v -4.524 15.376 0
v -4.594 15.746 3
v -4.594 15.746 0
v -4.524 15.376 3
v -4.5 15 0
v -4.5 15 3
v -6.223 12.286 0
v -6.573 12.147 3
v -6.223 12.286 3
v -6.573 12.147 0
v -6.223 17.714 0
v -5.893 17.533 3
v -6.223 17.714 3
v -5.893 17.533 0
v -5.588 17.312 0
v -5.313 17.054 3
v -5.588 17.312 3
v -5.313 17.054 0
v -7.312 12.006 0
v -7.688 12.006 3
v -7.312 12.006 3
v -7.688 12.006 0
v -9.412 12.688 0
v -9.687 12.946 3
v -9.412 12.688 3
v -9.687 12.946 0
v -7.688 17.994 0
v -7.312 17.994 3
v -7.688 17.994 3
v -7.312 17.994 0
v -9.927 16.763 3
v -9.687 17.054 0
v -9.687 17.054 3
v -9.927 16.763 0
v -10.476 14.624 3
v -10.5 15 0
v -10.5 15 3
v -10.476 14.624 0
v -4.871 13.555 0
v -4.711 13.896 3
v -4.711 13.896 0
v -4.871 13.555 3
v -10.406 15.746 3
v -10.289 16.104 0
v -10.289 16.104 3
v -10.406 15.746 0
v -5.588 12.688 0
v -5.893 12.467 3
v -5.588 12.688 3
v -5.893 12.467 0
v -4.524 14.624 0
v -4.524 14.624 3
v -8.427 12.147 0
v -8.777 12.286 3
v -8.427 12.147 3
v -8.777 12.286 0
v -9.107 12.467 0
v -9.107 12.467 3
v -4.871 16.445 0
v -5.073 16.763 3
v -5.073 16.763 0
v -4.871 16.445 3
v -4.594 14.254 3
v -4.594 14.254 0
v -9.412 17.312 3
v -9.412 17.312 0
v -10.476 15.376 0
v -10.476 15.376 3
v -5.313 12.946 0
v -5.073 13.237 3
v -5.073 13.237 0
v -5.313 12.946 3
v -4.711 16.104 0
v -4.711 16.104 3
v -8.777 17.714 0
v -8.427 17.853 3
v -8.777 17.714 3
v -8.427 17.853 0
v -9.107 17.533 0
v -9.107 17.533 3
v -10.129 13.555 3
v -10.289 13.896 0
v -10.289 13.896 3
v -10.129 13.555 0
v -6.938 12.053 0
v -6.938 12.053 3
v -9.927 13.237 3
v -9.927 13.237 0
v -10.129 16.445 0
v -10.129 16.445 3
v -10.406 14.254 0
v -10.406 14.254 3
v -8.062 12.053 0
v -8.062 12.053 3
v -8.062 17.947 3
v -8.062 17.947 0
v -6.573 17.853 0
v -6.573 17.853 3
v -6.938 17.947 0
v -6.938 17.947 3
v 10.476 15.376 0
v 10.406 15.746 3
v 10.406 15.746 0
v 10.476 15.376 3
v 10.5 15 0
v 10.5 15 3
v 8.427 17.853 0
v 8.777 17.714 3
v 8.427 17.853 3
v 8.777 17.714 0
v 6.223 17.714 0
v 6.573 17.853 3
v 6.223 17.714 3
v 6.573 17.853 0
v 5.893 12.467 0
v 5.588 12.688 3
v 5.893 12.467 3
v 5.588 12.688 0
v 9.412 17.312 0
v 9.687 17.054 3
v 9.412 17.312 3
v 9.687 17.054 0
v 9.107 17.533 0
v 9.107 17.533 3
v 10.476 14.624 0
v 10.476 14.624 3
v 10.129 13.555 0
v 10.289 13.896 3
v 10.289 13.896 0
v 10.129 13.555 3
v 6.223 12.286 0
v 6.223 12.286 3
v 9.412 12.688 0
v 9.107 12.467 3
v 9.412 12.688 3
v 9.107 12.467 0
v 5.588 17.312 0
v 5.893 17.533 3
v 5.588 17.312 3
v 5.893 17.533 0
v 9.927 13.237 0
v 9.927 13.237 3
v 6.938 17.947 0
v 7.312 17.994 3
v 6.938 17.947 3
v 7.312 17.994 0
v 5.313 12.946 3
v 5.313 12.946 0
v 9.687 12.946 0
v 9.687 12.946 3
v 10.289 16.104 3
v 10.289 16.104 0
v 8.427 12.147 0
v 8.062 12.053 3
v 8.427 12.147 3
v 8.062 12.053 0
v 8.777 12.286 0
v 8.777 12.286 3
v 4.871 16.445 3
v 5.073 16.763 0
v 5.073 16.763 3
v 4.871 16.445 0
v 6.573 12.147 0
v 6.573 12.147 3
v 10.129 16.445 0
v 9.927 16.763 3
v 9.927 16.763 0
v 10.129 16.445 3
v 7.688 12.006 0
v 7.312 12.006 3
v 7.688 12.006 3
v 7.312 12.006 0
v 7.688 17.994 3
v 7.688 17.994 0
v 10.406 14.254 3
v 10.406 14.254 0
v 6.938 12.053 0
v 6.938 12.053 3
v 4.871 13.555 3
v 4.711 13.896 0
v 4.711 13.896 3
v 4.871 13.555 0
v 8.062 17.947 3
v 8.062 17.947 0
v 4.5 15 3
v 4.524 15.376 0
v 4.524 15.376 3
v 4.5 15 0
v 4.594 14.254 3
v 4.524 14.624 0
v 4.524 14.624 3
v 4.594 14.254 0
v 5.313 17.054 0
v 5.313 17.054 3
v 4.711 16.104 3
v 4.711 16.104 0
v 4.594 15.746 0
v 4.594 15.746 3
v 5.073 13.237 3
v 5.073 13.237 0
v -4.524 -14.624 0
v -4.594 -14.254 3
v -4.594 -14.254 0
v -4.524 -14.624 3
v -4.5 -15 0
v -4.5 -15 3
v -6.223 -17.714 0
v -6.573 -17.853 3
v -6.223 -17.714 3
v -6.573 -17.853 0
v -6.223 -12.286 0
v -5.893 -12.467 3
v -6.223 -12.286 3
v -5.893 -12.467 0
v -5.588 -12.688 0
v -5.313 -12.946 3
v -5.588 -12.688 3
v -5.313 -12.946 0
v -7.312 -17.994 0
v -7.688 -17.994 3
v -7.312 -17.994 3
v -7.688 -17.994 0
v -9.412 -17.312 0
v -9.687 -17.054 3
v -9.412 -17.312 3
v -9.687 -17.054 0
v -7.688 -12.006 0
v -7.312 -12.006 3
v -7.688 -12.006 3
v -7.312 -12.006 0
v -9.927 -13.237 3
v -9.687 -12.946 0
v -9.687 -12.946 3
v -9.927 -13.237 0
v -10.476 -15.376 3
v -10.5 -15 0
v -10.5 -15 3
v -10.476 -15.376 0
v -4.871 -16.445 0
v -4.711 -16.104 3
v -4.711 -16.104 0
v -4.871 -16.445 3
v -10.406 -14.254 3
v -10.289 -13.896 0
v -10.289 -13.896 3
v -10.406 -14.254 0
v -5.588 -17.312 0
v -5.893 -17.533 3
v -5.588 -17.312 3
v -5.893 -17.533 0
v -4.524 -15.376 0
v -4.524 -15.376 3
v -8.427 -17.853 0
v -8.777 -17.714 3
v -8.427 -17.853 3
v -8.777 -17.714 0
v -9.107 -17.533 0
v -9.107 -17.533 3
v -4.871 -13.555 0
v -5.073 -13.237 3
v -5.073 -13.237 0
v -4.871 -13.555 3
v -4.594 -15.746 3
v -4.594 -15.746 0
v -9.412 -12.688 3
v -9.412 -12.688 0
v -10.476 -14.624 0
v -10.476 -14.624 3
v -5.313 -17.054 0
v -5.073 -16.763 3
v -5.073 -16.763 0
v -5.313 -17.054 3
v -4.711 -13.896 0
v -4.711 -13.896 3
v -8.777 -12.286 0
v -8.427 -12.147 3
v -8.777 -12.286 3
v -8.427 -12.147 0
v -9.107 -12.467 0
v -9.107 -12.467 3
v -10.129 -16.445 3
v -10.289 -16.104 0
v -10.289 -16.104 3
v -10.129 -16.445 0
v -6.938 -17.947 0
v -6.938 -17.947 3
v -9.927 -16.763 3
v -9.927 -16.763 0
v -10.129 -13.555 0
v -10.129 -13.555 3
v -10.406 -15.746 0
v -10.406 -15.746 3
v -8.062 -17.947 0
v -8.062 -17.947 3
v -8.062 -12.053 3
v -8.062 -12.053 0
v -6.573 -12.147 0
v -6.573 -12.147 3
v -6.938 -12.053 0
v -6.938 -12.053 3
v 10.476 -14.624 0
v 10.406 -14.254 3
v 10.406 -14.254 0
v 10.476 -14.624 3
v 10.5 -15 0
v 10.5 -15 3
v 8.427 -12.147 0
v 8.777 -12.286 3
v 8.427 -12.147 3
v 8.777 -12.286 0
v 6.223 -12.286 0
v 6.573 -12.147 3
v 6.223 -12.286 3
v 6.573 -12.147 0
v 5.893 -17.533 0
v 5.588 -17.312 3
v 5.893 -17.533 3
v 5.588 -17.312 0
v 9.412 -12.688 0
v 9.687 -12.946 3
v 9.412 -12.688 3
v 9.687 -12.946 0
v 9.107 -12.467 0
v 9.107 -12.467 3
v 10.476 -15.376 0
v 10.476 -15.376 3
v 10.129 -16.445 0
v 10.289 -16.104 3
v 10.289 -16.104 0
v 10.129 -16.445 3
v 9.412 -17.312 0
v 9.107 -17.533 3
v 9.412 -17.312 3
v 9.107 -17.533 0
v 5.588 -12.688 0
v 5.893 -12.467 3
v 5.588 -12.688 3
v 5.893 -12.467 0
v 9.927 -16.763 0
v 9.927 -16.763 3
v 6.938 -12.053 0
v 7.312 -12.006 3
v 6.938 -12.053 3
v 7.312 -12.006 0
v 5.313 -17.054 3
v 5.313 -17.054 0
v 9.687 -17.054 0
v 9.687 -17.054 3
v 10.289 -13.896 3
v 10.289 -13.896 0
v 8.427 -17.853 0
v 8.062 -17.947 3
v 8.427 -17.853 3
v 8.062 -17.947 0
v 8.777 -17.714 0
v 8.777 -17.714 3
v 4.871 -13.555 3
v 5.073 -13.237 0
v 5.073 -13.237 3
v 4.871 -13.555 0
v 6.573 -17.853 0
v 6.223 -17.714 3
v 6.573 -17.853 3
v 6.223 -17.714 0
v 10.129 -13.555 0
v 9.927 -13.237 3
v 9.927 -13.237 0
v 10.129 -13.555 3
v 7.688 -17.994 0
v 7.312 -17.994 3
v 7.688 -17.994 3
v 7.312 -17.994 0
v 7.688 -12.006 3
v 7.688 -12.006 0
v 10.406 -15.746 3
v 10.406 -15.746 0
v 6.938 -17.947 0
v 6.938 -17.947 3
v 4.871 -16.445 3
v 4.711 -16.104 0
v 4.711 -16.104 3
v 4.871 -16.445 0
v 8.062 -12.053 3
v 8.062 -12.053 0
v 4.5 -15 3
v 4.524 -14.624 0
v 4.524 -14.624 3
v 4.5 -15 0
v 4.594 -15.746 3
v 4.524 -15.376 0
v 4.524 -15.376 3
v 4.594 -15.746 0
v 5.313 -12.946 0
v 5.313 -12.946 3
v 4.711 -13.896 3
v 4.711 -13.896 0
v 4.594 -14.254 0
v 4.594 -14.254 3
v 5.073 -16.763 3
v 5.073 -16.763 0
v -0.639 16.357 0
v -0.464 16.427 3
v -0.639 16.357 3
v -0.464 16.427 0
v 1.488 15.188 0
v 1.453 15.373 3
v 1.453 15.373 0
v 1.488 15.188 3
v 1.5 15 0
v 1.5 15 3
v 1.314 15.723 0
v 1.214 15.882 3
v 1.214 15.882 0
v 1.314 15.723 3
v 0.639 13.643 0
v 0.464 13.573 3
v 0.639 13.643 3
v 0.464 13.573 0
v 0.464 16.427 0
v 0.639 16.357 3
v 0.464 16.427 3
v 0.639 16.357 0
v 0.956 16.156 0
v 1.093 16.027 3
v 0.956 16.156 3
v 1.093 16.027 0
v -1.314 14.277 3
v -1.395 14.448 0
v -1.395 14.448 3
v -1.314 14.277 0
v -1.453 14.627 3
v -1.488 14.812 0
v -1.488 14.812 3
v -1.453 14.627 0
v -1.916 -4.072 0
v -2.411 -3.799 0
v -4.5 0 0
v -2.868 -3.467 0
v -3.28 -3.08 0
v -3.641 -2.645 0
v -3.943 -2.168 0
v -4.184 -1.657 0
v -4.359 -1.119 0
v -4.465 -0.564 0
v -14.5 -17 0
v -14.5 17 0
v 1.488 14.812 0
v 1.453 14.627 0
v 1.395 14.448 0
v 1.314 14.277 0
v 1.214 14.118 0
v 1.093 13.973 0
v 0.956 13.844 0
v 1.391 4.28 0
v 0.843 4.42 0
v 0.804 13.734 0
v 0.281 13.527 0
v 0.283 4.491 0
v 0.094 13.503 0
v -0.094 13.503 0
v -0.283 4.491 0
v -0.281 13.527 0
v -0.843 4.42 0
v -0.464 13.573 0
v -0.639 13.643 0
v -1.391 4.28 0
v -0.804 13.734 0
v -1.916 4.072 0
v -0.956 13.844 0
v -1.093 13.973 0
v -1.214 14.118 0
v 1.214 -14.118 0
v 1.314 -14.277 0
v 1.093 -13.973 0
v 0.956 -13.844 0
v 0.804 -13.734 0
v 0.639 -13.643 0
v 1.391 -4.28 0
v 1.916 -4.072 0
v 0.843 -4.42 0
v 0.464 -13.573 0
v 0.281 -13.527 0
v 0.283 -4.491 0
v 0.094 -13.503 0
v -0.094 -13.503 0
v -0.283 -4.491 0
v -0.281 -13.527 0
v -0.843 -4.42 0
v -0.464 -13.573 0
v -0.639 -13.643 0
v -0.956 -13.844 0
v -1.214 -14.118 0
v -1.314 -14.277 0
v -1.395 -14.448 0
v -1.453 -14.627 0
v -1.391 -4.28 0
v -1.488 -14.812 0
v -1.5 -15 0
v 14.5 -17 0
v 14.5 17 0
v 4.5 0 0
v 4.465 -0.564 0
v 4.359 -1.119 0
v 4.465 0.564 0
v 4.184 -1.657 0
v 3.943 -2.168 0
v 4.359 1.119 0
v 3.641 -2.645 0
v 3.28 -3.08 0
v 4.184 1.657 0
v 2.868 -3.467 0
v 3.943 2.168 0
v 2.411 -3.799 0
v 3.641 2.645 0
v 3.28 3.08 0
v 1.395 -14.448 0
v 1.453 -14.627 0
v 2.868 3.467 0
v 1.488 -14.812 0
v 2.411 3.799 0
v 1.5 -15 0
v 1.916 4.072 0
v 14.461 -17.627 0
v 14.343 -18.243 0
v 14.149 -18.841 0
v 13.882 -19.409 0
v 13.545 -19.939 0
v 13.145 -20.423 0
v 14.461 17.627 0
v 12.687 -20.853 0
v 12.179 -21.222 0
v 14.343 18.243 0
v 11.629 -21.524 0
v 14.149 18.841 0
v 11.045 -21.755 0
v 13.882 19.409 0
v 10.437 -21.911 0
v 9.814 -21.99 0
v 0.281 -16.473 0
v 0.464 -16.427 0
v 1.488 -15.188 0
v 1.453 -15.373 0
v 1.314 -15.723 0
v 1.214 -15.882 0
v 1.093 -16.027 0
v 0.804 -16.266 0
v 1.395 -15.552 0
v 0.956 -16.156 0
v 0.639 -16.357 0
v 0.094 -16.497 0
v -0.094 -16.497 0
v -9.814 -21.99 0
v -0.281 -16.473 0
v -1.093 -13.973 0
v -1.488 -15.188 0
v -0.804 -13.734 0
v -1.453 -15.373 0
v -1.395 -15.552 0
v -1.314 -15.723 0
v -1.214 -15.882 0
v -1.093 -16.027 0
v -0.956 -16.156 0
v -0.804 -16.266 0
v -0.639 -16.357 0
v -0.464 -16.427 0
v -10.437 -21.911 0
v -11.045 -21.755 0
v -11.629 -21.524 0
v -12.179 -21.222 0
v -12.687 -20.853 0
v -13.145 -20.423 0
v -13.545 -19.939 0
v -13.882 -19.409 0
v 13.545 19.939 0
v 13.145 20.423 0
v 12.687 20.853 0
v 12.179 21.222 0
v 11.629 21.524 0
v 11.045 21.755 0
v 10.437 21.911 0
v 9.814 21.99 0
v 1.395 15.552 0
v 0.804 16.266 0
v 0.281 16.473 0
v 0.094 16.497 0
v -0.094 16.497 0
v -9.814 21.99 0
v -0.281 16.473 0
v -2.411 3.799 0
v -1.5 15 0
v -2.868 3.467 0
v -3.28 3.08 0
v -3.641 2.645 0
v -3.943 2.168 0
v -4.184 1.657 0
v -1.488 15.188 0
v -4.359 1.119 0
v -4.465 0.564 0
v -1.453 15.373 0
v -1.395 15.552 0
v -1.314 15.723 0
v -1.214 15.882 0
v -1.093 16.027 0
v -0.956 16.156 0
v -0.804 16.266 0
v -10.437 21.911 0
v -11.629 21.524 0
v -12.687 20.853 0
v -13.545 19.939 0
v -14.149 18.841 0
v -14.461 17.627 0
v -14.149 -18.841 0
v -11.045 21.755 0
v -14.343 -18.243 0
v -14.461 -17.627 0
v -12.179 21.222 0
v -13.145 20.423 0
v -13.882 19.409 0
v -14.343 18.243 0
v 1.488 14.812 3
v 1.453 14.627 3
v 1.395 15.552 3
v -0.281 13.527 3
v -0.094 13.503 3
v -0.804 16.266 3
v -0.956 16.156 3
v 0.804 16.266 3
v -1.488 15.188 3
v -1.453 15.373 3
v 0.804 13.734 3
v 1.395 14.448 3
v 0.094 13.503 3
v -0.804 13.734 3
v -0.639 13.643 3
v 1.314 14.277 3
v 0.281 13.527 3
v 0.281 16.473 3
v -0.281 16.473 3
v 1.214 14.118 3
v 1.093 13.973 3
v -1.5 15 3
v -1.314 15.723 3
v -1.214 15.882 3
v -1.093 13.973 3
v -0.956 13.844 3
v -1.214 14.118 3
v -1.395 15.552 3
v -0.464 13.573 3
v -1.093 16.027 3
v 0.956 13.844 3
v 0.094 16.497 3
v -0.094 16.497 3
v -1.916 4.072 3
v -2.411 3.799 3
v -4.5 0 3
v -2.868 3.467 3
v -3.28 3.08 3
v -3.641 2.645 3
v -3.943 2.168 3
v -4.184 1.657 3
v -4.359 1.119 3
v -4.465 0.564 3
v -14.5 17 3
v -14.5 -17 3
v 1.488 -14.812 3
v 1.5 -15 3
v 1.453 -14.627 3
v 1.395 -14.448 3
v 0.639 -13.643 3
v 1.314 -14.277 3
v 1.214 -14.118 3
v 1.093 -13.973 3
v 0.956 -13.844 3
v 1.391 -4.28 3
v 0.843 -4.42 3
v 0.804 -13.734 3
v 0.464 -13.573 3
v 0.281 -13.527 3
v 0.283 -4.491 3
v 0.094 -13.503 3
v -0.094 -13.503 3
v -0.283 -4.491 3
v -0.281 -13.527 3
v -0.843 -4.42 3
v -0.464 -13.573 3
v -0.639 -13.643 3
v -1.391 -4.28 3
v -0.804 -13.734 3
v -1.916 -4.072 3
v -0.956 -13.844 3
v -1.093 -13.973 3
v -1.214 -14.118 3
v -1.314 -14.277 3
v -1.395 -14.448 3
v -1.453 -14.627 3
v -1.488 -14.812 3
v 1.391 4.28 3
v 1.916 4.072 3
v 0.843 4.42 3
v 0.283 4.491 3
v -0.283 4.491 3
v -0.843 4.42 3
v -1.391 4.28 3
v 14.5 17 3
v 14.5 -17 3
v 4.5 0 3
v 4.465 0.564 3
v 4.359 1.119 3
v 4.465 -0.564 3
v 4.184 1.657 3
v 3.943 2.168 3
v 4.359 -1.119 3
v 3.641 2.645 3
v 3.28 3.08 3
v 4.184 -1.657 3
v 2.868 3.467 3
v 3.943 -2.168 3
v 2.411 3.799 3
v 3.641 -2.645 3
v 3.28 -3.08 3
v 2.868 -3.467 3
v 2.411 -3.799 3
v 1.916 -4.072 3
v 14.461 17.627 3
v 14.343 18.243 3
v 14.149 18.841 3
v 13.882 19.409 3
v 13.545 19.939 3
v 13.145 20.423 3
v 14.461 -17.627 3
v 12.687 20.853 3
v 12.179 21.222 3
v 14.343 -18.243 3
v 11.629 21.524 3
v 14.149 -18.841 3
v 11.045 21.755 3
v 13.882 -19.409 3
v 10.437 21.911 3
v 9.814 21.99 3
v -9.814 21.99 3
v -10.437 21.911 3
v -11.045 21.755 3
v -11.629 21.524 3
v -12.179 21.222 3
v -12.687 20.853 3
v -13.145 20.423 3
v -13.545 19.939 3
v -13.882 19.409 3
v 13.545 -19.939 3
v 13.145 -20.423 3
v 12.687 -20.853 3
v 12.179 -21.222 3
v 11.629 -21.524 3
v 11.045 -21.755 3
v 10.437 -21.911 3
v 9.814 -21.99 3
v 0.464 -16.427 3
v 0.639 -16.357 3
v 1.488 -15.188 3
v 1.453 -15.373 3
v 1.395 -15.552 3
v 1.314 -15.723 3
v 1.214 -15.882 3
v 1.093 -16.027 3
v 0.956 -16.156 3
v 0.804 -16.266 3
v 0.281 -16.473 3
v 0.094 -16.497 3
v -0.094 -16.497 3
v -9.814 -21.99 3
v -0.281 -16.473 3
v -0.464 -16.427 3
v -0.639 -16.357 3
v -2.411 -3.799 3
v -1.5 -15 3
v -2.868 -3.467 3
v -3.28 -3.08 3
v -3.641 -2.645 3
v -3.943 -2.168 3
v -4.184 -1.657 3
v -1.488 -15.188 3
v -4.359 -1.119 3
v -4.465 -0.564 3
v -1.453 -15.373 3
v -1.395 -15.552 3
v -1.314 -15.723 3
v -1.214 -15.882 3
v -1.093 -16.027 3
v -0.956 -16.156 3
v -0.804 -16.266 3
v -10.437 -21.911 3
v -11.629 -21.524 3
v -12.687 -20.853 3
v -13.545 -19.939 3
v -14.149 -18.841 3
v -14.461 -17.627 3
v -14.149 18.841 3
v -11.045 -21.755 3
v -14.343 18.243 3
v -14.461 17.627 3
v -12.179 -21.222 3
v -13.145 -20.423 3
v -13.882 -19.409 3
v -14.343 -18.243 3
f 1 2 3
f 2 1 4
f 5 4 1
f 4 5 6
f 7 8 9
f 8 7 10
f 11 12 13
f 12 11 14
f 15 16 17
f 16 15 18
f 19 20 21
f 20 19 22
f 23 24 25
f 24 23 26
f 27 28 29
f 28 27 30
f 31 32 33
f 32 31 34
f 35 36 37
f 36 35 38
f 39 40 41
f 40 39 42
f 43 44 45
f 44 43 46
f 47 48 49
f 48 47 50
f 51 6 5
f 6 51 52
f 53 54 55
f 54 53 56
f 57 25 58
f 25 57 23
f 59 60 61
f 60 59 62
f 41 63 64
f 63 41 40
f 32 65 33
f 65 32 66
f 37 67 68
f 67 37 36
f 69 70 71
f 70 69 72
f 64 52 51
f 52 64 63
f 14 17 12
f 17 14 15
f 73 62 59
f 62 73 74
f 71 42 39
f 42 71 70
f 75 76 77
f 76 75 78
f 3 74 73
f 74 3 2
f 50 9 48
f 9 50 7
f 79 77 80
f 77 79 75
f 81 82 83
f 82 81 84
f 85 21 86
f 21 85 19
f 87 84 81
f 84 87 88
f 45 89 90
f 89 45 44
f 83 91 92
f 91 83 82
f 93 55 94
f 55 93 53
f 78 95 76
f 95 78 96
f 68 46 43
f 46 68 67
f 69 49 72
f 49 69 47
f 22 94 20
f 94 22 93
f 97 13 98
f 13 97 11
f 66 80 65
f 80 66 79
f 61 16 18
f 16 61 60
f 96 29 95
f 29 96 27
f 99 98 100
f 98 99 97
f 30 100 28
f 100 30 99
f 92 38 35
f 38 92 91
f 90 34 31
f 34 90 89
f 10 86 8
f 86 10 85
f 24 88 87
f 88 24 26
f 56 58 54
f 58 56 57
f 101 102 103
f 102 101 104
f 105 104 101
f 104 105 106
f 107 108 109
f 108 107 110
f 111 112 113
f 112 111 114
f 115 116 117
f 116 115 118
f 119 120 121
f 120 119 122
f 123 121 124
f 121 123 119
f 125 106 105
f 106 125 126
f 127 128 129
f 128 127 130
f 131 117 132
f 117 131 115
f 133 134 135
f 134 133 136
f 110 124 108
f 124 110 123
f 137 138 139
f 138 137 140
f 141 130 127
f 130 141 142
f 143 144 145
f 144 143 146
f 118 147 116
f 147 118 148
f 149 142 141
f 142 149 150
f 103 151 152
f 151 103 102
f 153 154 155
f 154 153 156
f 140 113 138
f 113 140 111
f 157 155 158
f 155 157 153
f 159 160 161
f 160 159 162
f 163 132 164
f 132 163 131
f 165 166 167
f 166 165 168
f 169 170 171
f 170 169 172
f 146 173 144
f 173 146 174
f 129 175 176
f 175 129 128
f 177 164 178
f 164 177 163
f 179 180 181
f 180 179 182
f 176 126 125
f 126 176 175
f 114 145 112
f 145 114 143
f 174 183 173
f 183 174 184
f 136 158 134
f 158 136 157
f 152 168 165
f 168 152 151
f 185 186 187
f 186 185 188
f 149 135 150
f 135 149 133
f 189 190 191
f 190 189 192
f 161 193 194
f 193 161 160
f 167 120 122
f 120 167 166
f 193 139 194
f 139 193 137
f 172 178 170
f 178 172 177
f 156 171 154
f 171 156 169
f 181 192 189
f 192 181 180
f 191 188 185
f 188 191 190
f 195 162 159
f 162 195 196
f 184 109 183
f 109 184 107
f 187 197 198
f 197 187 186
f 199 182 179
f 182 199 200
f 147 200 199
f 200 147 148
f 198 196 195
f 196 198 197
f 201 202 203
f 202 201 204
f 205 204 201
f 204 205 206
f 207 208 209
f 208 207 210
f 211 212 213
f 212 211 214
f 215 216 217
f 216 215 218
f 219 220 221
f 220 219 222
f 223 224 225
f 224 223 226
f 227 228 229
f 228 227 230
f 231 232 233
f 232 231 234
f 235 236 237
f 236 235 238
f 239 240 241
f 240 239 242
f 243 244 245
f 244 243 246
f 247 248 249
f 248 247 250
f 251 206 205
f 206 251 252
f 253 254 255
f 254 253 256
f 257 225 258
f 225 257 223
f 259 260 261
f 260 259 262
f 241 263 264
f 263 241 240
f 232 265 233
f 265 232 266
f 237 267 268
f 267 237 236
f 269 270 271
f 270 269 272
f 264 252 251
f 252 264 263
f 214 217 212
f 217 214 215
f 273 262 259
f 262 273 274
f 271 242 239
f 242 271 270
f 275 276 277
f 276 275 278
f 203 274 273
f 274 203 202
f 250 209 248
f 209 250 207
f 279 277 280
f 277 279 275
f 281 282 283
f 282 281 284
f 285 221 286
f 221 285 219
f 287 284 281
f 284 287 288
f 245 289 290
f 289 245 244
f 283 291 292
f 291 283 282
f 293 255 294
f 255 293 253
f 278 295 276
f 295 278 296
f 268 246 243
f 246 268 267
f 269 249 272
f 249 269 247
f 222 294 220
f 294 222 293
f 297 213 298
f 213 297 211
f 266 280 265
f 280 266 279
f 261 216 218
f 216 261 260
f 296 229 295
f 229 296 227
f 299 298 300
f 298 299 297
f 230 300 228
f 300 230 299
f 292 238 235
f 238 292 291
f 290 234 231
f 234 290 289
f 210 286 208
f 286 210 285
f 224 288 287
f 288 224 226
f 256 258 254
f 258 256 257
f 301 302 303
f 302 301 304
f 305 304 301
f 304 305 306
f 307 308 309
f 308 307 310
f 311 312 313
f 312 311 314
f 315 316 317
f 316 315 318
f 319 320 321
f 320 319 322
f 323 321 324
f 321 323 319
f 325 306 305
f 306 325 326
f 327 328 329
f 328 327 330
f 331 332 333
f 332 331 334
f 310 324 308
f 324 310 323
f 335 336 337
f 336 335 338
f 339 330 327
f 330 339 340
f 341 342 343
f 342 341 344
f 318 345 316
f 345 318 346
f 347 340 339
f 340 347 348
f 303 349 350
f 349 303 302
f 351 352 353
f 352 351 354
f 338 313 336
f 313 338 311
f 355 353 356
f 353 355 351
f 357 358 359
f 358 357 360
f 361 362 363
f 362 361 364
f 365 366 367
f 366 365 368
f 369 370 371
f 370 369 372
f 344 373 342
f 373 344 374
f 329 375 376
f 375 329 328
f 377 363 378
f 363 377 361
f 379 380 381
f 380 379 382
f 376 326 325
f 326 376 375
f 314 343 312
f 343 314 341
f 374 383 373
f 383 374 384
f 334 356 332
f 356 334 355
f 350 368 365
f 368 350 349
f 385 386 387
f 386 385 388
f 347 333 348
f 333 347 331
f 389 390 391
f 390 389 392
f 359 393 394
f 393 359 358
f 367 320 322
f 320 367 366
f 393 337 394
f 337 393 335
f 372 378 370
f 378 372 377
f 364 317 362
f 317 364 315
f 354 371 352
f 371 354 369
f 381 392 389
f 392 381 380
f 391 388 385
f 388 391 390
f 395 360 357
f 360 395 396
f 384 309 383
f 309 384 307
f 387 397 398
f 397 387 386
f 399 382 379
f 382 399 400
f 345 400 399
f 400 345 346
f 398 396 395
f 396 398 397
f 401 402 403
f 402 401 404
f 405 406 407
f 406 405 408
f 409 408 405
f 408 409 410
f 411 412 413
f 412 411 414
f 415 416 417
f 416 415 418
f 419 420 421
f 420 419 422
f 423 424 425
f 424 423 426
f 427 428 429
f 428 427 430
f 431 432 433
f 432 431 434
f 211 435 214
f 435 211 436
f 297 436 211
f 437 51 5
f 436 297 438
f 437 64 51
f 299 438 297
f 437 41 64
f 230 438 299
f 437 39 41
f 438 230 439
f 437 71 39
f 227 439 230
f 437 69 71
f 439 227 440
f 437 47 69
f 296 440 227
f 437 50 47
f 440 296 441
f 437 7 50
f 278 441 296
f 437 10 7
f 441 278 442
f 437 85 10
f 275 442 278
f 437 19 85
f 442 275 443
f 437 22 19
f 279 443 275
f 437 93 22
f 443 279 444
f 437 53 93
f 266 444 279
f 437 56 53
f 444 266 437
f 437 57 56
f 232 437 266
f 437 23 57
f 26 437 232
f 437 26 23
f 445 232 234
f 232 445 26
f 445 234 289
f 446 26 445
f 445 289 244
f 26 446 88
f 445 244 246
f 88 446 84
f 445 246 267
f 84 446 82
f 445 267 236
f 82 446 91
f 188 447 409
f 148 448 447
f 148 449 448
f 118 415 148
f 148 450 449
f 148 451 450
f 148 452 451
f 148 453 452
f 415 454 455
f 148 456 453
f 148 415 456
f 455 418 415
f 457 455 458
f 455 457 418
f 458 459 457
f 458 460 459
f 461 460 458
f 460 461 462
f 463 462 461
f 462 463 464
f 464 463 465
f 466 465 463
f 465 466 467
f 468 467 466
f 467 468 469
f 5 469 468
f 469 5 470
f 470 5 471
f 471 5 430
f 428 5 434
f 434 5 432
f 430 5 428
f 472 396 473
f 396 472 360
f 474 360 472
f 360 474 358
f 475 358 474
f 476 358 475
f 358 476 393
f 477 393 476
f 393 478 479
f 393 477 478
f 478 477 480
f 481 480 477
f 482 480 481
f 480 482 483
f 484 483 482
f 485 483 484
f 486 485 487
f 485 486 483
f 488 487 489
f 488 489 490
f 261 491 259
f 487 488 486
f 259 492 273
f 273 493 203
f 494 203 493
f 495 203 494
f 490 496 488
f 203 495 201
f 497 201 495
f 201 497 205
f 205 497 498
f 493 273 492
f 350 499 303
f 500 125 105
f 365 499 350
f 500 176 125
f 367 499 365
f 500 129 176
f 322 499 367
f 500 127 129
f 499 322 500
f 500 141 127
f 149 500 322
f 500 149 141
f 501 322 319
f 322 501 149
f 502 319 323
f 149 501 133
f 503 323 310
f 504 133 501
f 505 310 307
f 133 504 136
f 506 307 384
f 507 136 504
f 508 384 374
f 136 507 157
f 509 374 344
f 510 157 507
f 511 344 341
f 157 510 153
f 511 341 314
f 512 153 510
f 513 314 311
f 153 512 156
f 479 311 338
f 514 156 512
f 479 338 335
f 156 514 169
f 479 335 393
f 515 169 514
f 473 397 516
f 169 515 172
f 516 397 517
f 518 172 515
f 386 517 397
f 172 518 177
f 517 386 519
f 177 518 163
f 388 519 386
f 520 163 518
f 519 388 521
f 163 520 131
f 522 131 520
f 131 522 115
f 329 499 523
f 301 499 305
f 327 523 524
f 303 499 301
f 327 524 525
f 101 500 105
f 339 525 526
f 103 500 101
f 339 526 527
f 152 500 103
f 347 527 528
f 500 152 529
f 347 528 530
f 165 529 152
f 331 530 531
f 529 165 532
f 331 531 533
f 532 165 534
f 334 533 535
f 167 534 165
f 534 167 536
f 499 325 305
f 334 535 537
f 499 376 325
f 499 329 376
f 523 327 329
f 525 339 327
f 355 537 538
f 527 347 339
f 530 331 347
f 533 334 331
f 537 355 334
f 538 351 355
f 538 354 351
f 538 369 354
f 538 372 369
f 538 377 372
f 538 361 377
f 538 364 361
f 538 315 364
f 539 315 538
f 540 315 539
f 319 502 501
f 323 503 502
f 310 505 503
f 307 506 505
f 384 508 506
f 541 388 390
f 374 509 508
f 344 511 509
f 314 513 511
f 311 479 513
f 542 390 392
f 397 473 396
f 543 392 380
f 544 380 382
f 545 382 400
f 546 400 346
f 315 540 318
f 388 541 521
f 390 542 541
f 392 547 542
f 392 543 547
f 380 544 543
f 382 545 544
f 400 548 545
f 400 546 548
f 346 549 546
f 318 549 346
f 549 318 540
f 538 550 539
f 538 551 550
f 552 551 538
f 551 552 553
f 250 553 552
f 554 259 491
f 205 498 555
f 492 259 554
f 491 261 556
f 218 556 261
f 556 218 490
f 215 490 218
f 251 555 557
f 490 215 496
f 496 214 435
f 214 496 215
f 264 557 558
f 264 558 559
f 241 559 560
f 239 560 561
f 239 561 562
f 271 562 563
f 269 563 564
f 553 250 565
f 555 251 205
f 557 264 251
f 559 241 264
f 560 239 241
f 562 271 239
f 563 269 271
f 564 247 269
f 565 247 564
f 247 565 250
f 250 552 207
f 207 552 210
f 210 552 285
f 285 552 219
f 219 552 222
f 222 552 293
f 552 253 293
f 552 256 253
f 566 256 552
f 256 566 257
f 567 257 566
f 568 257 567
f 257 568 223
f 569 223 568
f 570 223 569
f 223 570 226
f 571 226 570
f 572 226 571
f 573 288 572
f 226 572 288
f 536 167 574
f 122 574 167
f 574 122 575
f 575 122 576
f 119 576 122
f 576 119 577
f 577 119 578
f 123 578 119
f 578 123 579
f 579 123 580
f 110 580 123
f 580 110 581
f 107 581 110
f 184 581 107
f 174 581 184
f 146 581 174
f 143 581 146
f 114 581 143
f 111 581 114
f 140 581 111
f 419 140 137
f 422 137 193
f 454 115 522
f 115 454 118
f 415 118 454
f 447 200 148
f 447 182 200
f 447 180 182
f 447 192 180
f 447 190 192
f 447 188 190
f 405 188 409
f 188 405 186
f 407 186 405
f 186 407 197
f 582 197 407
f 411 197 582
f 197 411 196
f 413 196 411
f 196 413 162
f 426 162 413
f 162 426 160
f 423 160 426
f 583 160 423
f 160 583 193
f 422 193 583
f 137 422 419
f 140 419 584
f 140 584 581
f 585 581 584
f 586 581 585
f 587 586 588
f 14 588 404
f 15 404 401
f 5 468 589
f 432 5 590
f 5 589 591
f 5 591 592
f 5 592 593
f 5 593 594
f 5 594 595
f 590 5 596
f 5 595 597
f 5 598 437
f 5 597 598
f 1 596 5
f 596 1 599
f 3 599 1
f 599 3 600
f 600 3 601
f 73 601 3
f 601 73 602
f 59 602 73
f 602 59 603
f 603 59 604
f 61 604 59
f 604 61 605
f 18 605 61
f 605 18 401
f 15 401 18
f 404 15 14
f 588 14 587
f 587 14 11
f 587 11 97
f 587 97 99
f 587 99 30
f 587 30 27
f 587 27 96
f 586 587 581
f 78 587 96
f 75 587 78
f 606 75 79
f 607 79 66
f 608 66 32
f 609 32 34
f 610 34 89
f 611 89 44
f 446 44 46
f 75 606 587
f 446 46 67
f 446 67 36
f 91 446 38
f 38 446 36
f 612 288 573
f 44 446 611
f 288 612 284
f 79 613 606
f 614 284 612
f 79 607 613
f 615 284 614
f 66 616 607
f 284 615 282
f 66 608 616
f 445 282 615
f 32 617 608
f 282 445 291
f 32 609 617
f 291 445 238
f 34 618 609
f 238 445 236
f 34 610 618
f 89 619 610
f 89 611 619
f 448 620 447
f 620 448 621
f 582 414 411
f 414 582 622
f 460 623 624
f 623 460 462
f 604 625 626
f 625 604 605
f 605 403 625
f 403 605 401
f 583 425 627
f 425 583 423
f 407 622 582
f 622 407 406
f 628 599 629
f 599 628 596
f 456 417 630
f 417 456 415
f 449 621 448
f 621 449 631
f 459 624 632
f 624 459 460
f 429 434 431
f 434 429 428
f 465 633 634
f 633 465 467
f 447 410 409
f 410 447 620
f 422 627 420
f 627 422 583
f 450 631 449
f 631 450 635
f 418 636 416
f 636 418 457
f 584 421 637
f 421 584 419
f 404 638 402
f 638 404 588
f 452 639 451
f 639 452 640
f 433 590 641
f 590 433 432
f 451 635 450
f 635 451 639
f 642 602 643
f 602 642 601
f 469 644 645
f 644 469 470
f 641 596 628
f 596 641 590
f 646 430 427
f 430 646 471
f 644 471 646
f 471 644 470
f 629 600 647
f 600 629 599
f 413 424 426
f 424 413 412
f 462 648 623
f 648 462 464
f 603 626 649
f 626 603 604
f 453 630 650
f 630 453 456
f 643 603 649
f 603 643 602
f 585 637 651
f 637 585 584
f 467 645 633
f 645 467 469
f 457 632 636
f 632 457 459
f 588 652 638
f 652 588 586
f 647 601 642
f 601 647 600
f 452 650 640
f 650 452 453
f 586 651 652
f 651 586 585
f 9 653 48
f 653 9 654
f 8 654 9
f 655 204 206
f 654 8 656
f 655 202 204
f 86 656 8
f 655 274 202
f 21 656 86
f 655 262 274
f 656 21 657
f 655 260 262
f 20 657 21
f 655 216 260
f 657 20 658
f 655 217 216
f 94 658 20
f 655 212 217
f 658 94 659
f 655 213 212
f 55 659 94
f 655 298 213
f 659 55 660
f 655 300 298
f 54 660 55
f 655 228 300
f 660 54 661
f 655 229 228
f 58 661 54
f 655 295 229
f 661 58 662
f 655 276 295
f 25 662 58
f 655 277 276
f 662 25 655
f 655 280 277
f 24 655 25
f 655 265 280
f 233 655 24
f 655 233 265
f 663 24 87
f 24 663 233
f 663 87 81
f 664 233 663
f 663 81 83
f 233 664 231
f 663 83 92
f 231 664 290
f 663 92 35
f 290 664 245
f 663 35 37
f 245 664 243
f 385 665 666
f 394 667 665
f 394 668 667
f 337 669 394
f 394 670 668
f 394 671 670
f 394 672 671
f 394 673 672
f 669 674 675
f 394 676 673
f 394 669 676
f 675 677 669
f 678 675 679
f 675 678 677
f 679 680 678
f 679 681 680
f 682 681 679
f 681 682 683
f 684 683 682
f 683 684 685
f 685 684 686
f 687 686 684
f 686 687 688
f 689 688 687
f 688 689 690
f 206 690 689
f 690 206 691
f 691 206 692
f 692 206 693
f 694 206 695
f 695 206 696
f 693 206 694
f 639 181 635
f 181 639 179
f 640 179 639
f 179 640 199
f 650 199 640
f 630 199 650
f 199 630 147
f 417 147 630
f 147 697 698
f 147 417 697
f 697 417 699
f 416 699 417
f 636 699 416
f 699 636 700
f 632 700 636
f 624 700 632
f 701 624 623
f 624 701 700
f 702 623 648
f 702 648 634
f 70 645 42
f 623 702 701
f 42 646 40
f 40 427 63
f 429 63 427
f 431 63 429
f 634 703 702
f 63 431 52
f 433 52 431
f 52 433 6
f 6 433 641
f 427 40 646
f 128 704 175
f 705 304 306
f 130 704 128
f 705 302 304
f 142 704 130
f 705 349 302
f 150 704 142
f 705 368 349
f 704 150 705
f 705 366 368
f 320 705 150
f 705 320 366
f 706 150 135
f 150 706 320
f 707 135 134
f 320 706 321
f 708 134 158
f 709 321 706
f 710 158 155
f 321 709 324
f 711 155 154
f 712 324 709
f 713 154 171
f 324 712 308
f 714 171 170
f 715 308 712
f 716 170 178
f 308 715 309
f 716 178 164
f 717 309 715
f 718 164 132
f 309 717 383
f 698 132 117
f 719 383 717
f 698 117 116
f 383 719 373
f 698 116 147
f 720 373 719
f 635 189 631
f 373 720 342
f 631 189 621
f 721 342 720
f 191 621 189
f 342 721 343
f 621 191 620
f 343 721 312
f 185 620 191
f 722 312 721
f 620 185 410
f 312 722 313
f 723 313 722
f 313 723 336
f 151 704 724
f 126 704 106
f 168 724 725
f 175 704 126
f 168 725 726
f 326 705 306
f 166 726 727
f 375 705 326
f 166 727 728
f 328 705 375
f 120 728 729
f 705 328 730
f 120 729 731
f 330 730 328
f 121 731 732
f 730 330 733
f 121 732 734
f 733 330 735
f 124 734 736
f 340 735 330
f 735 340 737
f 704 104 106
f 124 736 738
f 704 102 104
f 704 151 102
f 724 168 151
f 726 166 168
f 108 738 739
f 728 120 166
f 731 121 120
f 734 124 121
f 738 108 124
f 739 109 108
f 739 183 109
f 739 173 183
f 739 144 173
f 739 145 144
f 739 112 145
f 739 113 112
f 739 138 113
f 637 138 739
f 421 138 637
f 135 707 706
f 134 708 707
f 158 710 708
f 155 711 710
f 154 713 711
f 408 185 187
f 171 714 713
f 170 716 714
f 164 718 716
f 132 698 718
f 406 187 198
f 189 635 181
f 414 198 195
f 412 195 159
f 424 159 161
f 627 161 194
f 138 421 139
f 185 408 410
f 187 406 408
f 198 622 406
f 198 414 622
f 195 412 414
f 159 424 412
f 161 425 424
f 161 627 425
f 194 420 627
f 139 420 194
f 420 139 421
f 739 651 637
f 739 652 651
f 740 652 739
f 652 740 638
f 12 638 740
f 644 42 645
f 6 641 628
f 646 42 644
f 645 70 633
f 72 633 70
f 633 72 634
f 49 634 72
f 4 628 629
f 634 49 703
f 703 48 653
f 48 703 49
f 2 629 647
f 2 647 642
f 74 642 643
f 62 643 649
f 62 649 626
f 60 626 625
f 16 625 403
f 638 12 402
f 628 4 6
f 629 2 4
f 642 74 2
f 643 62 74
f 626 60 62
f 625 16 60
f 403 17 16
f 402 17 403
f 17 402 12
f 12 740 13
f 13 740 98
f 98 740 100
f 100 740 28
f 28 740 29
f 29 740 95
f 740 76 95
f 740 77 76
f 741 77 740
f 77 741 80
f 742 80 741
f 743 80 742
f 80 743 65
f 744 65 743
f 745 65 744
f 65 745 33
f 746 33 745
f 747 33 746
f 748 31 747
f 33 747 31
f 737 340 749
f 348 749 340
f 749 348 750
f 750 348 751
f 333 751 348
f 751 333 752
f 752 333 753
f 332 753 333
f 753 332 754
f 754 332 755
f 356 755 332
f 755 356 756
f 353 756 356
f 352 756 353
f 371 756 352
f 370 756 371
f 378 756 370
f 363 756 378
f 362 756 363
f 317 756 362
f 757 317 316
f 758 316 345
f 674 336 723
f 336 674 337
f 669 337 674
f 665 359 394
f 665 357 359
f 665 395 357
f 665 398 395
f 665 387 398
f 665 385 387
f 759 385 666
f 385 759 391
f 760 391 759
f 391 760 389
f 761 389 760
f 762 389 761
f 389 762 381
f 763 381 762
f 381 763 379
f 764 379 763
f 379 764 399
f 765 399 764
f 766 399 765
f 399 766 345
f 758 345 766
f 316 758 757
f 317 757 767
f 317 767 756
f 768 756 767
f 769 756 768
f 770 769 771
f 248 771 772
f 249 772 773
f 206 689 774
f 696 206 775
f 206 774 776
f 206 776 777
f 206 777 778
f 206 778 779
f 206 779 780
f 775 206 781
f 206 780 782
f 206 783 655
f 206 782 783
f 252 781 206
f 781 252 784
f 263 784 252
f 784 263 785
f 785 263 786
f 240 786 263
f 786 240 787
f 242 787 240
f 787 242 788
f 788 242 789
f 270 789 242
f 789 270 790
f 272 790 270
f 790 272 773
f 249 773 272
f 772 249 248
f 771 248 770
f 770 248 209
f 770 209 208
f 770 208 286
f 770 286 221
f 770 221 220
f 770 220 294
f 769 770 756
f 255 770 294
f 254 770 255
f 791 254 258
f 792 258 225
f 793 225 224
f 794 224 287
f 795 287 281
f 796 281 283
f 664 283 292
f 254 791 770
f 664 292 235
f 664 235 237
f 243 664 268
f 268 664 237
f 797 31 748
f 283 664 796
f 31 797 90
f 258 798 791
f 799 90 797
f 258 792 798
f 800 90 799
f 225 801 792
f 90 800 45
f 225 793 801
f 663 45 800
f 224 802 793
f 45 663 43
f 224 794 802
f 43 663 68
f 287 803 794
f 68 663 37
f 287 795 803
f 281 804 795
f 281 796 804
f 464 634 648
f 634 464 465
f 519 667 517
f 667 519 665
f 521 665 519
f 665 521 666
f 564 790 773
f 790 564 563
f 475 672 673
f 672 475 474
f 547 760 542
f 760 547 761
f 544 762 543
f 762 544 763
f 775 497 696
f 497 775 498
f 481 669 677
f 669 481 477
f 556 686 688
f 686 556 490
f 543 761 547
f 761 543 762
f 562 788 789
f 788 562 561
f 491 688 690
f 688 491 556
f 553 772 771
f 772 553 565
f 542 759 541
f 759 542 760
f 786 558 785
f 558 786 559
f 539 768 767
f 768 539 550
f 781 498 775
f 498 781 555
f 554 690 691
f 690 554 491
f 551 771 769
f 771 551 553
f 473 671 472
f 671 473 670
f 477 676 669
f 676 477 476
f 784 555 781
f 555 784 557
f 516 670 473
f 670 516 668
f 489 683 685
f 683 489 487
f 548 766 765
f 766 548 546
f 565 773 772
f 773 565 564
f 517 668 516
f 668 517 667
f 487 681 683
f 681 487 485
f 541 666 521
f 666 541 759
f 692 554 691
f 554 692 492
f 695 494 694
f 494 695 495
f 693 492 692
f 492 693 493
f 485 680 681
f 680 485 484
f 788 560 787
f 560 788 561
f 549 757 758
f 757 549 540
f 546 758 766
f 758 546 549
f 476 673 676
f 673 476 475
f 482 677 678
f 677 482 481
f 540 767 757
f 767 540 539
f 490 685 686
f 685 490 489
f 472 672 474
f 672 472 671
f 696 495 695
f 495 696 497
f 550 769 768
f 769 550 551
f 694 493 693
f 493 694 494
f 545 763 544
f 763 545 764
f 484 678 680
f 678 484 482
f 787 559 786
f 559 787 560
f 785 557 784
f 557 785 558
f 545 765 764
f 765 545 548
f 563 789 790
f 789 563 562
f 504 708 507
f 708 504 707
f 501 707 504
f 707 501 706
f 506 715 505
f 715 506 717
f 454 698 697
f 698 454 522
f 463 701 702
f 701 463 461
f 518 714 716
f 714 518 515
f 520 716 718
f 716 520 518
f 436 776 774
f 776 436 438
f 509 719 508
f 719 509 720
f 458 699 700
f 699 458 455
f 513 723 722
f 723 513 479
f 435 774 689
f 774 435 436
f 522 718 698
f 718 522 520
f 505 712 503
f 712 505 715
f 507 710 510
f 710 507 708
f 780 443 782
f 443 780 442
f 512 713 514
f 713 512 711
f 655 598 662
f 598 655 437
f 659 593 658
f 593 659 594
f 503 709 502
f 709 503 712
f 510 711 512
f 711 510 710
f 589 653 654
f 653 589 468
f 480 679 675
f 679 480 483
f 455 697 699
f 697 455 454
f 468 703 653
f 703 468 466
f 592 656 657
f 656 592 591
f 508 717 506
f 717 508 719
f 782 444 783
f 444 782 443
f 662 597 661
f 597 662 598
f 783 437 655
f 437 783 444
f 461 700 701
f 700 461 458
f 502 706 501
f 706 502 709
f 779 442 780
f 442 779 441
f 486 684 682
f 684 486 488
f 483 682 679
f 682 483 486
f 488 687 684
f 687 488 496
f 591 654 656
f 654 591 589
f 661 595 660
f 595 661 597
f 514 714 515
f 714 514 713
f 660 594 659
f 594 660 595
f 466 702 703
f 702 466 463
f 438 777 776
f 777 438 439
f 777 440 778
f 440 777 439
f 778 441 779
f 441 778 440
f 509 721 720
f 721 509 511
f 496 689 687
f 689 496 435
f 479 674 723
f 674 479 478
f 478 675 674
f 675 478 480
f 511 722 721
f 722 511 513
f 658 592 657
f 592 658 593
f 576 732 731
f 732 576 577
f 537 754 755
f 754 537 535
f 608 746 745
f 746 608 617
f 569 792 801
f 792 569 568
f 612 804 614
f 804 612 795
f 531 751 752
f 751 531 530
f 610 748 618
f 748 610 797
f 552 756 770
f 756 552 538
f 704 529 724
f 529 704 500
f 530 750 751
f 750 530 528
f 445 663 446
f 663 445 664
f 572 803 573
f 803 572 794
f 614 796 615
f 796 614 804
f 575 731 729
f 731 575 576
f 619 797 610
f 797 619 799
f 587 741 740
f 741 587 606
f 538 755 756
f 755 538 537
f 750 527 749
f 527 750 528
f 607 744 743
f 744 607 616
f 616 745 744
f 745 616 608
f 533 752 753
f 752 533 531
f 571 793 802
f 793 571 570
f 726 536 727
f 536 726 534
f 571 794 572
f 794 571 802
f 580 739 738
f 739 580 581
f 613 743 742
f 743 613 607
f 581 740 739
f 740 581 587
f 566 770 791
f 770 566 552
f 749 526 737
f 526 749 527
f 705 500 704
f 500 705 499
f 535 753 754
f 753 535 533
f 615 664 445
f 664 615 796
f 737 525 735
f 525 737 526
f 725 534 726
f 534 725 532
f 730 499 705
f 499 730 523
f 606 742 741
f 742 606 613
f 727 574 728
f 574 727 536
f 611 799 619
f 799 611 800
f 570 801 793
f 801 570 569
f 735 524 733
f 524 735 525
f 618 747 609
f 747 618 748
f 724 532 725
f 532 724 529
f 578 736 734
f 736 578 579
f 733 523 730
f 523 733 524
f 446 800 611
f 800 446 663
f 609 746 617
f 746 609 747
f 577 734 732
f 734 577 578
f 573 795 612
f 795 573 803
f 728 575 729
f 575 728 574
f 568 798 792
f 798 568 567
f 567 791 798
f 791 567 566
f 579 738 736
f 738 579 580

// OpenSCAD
$fn = 50;


difference() {
	union() {
		hull() {
			translate(v = [-9.5000000000, 17.0000000000, 0]) {
				cylinder(h = 3, r = 5);
			}
			translate(v = [9.5000000000, 17.0000000000, 0]) {
				cylinder(h = 3, r = 5);
			}
			translate(v = [-9.5000000000, -17.0000000000, 0]) {
				cylinder(h = 3, r = 5);
			}
			translate(v = [9.5000000000, -17.0000000000, 0]) {
				cylinder(h = 3, r = 5);
			}
		}
	}
	union() {
		#translate(v = [-7.5000000000, 15.0000000000, 0]) {
			cylinder(h = 3, r = 3.0000000000);
		}
		#translate(v = [7.5000000000, 15.0000000000, 0]) {
			cylinder(h = 3, r = 3.0000000000);
		}
		#translate(v = [-7.5000000000, -15.0000000000, 0]) {
			cylinder(h = 3, r = 3.0000000000);
		}
		#translate(v = [7.5000000000, -15.0000000000, 0]) {
			cylinder(h = 3, r = 3.0000000000);
		}
		#translate(v = [-7.5000000000, -15.0000000000, -100.0000000000]) {
			cylinder(h = 200, r = 3.0000000000);
		}
		#translate(v = [-7.5000000000, 15.0000000000, -100.0000000000]) {
			cylinder(h = 200, r = 3.0000000000);
		}
		#translate(v = [7.5000000000, -15.0000000000, -100.0000000000]) {
			cylinder(h = 200, r = 3.0000000000);
		}
		#translate(v = [7.5000000000, 15.0000000000, -100.0000000000]) {
			cylinder(h = 200, r = 3.0000000000);
		}
		#translate(v = [-7.5000000000, 15.0000000000, 0]) {
			cylinder(h = 3, r = 1.5000000000);
		}
		#translate(v = [0.0000000000, 15.0000000000, 0]) {
			cylinder(h = 3, r = 1.5000000000);
		}
		#translate(v = [7.5000000000, 15.0000000000, 0]) {
			cylinder(h = 3, r = 1.5000000000);
		}
		#translate(v = [-7.5000000000, -15.0000000000, 0]) {
			cylinder(h = 3, r = 1.5000000000);
		}
		#translate(v = [0.0000000000, -15.0000000000, 0]) {
			cylinder(h = 3, r = 1.5000000000);
		}
		#translate(v = [7.5000000000, -15.0000000000, 0]) {
			cylinder(h = 3, r = 1.5000000000);
		}
		#translate(v = [-7.5000000000, 15.0000000000, 0]) {
			cylinder(h = 3, r = 1.5000000000);
		}
		#translate(v = [0.0000000000, 15.0000000000, 0]) {
			cylinder(h = 3, r = 1.5000000000);
		}
		#translate(v = [7.5000000000, 15.0000000000, 0]) {
			cylinder(h = 3, r = 1.5000000000);
		}
		#translate(v = [-7.5000000000, -15.0000000000, 0]) {
			cylinder(h = 3, r = 1.5000000000);
		}
		#translate(v = [0.0000000000, -15.0000000000, 0]) {
			cylinder(h = 3, r = 1.5000000000);
		}
		#translate(v = [7.5000000000, -15.0000000000, 0]) {
			cylinder(h = 3, r = 1.5000000000);
		}
		#translate(v = [-7.5000000000, 15.0000000000, 0]) {
			cylinder(h = 3, r = 1.5000000000);
		}
		#translate(v = [0.0000000000, 15.0000000000, 0]) {
			cylinder(h = 3, r = 1.5000000000);
		}
		#translate(v = [7.5000000000, 15.0000000000, 0]) {
			cylinder(h = 3, r = 1.5000000000);
		}
		#translate(v = [-7.5000000000, -15.0000000000, 0]) {
			cylinder(h = 3, r = 1.5000000000);
		}
		#translate(v = [0.0000000000, -15.0000000000, 0]) {
			cylinder(h = 3, r = 1.5000000000);
		}
		#translate(v = [7.5000000000, -15.0000000000, 0]) {
			cylinder(h = 3, r = 1.5000000000);
		}
		#cylinder(h = 3, r = 4.5000000000);
	}
}
